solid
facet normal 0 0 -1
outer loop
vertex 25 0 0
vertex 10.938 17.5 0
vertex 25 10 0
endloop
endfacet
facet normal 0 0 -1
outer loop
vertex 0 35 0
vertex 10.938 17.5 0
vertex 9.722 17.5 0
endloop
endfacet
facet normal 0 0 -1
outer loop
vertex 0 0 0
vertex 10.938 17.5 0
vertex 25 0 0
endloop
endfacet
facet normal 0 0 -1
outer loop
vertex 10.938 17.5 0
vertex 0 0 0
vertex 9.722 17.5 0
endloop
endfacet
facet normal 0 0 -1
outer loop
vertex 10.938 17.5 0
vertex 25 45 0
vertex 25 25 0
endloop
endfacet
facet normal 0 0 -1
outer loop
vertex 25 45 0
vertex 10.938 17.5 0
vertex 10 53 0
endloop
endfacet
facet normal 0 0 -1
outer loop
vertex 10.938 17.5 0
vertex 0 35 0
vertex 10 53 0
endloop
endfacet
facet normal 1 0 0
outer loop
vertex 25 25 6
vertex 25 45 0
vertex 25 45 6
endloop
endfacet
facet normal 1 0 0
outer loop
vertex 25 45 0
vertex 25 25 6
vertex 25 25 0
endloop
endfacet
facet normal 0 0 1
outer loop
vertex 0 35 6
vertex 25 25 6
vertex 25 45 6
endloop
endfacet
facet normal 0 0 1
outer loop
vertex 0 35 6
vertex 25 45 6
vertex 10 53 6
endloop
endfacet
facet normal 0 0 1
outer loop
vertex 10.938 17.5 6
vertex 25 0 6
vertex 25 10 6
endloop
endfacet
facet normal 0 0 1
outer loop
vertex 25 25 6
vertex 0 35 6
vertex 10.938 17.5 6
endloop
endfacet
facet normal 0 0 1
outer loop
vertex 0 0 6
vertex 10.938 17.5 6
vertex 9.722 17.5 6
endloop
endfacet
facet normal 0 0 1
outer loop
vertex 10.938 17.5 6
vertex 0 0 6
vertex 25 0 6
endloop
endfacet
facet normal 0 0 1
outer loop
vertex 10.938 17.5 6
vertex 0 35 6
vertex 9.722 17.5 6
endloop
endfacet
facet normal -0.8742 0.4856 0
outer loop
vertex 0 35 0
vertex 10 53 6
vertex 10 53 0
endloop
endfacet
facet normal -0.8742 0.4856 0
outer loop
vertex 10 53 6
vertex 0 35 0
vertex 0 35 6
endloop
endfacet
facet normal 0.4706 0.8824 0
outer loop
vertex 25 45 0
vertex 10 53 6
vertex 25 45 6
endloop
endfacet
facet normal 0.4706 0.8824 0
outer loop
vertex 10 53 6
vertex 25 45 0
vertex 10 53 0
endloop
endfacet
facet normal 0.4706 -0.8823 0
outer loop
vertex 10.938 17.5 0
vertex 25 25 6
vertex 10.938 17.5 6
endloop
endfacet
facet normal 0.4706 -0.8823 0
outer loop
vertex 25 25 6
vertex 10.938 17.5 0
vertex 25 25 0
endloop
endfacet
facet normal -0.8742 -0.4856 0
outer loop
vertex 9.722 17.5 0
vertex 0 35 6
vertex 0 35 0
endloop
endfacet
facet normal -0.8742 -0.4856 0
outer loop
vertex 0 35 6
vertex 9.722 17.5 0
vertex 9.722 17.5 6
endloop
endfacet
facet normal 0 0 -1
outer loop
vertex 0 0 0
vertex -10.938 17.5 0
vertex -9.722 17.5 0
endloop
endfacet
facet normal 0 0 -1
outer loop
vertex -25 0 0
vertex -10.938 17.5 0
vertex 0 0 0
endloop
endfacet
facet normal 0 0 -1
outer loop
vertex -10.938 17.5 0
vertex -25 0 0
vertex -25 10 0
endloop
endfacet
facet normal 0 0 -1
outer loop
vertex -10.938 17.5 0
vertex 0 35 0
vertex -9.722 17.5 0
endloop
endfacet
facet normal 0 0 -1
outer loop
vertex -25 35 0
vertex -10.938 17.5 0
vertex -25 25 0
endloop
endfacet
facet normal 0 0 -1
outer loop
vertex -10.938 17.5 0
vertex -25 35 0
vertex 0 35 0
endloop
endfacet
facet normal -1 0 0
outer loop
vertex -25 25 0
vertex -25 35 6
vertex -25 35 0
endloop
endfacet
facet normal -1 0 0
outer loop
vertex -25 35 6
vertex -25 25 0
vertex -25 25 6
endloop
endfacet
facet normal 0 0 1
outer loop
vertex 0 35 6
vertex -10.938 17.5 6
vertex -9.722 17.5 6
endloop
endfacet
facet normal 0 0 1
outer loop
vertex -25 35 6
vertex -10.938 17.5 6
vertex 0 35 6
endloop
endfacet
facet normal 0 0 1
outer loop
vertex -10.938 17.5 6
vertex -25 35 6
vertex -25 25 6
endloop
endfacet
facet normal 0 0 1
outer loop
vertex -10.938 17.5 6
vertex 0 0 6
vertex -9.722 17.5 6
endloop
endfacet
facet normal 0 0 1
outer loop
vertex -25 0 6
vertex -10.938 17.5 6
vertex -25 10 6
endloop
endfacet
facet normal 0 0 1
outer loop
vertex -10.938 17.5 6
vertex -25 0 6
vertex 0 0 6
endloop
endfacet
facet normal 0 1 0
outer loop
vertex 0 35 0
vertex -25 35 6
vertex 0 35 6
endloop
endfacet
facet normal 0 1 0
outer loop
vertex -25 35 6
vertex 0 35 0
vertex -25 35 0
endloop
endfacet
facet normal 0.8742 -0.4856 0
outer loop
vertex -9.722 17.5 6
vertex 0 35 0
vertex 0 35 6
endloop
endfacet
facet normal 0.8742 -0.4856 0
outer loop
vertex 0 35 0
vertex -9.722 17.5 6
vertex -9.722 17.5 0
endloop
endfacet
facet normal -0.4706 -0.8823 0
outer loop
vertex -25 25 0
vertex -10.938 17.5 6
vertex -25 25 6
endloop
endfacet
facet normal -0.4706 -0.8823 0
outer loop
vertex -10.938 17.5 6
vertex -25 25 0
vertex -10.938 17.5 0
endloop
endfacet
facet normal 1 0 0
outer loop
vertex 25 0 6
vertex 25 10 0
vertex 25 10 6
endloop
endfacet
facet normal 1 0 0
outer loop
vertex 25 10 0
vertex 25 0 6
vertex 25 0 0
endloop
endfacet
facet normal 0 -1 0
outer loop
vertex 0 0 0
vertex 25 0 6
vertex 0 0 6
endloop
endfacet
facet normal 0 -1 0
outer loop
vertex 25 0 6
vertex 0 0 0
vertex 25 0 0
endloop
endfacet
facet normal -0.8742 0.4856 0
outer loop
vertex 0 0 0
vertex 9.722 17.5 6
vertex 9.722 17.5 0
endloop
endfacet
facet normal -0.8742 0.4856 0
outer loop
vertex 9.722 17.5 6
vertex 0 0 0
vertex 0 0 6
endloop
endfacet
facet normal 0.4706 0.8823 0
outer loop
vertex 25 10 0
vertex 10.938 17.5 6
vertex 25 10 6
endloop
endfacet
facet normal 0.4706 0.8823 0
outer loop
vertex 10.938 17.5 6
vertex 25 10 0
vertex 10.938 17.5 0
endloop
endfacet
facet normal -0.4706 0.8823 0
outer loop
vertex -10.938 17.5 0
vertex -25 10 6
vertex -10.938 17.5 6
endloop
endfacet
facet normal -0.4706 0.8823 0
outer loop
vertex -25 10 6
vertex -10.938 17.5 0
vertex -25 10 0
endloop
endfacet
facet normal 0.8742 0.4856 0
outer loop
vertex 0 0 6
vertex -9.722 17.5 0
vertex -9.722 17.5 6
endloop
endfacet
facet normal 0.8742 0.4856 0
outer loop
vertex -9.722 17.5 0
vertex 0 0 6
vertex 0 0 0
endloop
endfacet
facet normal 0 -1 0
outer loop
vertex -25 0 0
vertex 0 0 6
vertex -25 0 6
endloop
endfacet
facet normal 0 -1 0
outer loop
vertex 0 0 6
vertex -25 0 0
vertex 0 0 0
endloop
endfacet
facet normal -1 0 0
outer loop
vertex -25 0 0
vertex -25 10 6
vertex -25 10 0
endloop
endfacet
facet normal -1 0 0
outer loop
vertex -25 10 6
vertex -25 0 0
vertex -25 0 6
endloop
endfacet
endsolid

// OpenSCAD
// mirror(): reflect across a plane through the origin.
//
// The argument is the plane's normal, not an axis to flip about. The
// shape is reflected, not moved -- put it away from the origin first if
// you want to see both halves.

module wedge() {
    linear_extrude(6) polygon([[0,0], [25,0], [25,10], [10,18]]);
}

wedge();
color("steelblue") mirror([1, 0, 0]) wedge();

// Mirroring twice about different planes gets you a rotation, not a
// third copy -- reflections compose.
translate([0, 35, 0]) {
    wedge();
    color("tomato") mirror([0, 1, 0]) wedge();
    color("gold")   mirror([1, 0, 0]) mirror([0, 1, 0]) wedge();
}
